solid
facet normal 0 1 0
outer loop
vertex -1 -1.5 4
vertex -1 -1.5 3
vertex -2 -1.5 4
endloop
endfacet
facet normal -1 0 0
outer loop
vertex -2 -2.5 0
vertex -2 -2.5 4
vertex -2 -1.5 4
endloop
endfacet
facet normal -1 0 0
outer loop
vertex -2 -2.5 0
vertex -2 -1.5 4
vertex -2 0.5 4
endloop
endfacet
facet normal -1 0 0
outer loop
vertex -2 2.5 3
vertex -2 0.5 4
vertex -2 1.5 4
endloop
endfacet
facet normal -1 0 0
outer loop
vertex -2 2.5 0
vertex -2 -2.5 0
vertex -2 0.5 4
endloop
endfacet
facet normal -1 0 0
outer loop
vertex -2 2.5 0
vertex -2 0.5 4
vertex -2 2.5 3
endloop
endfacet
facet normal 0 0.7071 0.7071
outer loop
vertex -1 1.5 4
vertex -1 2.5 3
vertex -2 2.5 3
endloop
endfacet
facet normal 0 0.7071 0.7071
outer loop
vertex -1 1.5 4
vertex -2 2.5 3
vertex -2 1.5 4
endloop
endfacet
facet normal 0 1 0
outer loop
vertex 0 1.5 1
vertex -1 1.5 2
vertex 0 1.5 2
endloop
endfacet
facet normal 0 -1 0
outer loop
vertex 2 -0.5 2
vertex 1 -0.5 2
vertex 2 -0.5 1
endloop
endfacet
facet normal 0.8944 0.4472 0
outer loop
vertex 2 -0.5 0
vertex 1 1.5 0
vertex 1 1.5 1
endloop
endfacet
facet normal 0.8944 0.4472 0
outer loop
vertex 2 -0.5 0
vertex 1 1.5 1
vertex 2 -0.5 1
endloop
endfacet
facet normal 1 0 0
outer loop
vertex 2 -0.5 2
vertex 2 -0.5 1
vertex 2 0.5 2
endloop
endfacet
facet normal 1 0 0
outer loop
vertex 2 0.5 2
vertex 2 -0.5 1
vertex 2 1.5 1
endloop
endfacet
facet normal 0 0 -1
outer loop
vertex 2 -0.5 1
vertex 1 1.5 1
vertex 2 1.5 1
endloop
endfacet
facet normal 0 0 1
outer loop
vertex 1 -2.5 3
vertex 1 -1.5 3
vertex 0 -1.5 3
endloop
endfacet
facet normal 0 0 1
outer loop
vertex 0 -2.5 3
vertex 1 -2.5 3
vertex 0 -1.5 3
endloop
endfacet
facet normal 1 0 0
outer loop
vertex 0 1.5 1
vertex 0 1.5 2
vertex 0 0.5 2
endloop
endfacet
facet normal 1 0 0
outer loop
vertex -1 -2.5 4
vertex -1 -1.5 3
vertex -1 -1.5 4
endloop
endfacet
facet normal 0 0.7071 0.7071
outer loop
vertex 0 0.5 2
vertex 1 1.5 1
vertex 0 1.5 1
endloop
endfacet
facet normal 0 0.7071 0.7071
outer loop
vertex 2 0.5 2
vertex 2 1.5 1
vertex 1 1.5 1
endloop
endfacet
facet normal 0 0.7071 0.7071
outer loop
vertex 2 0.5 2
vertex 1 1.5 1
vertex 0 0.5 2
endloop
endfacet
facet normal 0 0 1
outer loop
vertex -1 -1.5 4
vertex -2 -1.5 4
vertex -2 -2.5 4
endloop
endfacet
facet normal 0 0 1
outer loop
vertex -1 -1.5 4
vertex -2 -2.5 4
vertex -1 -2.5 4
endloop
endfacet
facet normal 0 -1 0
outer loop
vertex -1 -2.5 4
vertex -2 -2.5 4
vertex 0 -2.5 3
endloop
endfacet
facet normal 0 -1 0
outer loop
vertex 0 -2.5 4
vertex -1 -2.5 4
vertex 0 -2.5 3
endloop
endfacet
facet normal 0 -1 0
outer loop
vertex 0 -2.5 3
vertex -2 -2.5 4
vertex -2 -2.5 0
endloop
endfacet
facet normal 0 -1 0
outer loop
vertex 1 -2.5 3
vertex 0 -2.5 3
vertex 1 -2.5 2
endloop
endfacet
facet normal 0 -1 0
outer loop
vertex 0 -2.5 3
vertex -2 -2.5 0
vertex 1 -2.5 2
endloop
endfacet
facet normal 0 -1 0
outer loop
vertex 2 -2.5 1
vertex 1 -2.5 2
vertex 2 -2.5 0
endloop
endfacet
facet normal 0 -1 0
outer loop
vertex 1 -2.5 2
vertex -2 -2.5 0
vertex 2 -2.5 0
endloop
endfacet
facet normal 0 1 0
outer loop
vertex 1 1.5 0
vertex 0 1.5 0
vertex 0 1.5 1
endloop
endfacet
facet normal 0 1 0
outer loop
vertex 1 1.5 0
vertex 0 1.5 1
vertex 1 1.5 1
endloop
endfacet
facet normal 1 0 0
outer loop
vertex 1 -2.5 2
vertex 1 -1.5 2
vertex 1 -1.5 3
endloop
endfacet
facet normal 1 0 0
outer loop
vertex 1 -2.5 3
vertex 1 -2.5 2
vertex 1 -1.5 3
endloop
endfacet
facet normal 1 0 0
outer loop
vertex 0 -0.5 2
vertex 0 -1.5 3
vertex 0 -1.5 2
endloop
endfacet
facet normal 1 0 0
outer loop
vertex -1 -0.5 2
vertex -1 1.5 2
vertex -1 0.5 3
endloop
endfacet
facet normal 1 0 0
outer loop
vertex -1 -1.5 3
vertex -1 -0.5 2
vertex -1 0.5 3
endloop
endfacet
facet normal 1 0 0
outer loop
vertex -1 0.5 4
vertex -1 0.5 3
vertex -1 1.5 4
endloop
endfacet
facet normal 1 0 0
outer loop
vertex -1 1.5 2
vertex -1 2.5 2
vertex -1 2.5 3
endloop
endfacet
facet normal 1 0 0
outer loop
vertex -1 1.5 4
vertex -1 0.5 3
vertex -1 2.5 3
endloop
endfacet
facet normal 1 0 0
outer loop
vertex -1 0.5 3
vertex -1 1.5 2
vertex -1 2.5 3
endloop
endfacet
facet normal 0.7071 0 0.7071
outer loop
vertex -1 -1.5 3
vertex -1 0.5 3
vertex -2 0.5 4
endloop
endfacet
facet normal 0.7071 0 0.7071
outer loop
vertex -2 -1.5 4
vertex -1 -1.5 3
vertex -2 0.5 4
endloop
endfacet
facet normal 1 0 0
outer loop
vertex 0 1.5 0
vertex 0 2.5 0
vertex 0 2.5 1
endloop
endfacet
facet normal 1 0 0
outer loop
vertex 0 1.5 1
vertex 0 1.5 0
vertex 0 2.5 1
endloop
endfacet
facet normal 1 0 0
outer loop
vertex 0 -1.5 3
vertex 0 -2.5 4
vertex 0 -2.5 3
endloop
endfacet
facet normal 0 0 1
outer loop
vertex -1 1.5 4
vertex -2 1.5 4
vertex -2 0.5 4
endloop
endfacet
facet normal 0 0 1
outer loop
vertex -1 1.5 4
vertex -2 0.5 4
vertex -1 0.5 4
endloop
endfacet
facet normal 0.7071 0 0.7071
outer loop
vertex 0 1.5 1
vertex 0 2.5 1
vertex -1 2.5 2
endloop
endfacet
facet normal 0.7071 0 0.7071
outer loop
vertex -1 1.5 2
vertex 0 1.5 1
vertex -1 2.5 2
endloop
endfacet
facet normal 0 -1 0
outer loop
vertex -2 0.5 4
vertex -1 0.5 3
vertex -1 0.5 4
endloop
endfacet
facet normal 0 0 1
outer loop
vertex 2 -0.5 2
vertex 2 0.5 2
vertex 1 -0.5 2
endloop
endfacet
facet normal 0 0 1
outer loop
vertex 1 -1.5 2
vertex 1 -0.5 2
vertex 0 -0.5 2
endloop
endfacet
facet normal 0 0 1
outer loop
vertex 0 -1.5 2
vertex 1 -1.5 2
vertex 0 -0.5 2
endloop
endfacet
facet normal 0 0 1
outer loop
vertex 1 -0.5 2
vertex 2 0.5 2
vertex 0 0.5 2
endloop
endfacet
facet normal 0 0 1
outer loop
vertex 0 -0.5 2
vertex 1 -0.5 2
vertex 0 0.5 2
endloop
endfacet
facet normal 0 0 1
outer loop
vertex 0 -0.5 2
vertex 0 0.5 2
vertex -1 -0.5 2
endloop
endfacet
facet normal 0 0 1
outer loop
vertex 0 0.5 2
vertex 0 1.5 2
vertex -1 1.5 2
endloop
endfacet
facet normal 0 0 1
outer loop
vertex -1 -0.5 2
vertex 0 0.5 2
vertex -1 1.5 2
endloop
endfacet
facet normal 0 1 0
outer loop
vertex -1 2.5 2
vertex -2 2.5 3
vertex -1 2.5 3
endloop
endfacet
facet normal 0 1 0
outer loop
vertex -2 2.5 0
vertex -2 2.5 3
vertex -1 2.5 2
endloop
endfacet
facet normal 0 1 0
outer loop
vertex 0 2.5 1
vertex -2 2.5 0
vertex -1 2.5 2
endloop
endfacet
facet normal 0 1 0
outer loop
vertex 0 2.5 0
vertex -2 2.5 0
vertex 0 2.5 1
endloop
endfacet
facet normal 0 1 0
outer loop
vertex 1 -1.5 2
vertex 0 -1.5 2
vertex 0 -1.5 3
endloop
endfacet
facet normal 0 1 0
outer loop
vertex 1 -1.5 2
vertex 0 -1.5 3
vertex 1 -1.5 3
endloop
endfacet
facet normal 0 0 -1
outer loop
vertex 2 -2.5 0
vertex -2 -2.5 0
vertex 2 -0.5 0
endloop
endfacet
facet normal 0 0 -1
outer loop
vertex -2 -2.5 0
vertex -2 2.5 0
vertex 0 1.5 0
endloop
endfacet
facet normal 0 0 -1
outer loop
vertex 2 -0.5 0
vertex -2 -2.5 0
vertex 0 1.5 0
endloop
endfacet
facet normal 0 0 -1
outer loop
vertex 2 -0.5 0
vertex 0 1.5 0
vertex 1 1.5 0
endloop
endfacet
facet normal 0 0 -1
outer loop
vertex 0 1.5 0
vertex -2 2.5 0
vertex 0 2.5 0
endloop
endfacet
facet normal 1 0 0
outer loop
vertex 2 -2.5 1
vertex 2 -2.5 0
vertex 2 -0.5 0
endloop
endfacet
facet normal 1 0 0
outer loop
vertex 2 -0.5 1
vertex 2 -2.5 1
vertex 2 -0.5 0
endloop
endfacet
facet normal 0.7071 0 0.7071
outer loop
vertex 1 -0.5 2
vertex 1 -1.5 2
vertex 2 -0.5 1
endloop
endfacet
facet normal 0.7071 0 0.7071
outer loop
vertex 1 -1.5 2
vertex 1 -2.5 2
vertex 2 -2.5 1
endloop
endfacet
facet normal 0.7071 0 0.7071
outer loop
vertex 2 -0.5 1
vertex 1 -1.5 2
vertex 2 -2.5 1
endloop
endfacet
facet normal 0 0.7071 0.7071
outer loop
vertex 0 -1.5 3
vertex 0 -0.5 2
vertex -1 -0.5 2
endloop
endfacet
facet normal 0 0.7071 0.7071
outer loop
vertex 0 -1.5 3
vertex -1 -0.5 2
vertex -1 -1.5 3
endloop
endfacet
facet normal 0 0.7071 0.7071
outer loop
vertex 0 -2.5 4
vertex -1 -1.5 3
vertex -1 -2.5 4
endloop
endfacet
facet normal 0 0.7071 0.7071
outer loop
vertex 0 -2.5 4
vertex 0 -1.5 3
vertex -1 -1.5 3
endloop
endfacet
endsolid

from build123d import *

# Parameters (mm, degrees)
SKETCH1_W           = 4
SKETCH1_H           = 5
BOSS_EXTRUDE1_DEPTH = 4
CUT_EXTRUDE1_DEPTH  = 5
CUT_EXTRUDE2_DEPTH  = 1
CUT_EXTRUDE3_DEPTH  = 1
CUT_EXTRUDE4_DEPTH  = 2
SKETCH6_W           = 2
SKETCH6_H           = 2
CUT_EXTRUDE5_DEPTH  = 4
CUT_EXTRUDE6_DEPTH  = 2
CUT_EXTRUDE7_DEPTH  = 1
CUT_EXTRUDE8_DEPTH  = 2
SKETCH12_W          = 1.414213562
SKETCH12_H          = 2
CUT_EXTRUDE9_DEPTH  = 3.828427125


with BuildPart() as part:
    # Sketch1 → Boss-Extrude1 (new body)
    with BuildSketch(Plane.XY):
        Rectangle(SKETCH1_W, SKETCH1_H)
    extrude(amount=BOSS_EXTRUDE1_DEPTH)

    # Sketch2 → Cut-Extrude1 (cut, through all)
    with BuildSketch(Plane(origin=(2, 0, 0), x_dir=(0, 0, -1), z_dir=(1, 0, 0))):
        Polygon((-3, 2.5), (-4, 1.5), (-4, 2.5), align=None)
    extrude(amount=-CUT_EXTRUDE1_DEPTH, mode=Mode.SUBTRACT)

    # Sketch3 → Cut-Extrude2 (cut)
    with BuildSketch(Plane(origin=(0, 2.5, 0), x_dir=(1, 0, 0), z_dir=(0, 1, 0))):
        Polygon((2, 0), (0, 0), (0, -1), (-1, -2), (-1, -3), (2, -3), align=None)
    extrude(amount=-CUT_EXTRUDE2_DEPTH, mode=Mode.SUBTRACT)

    # Sketch4 → Cut-Extrude3 (cut)
    with BuildSketch(Plane(origin=(0, 0, 0), x_dir=(-1, 0, 0), z_dir=(0, 0, -1))):
        Polygon((-2, 1.5), (-1, 1.5), (-2, -0.5), align=None)
    extrude(amount=-CUT_EXTRUDE3_DEPTH, mode=Mode.SUBTRACT)

    # Sketch5 → Cut-Extrude4 (cut)
    with BuildSketch(Plane(origin=(2, 0, 0), x_dir=(0, 0, -1), z_dir=(1, 0, 0))):
        Polygon((-1, 1.5), (-2, 0.5), (-2, 1.5), align=None)
    extrude(amount=-CUT_EXTRUDE4_DEPTH, mode=Mode.SUBTRACT)

    # Sketch6 → Cut-Extrude5 (cut)
    with BuildSketch(Plane(origin=(0, 2.5, 0), x_dir=(1, 0, 0), z_dir=(0, 1, 0))):
        with Locations((1, -3)):
            Rectangle(SKETCH6_W, SKETCH6_H)
    extrude(amount=-CUT_EXTRUDE5_DEPTH, mode=Mode.SUBTRACT)

    # Sketch7 → Cut-Extrude6 (cut, through all)
    with BuildSketch(Plane(origin=(0, -1.5, 0), x_dir=(1, 0, 0), z_dir=(0, 1, 0))):
        Polygon((2, -2), (1, -2), (1, -3), (0, -3), (0, -4), (2, -4), align=None)
    extrude(amount=-CUT_EXTRUDE6_DEPTH, mode=Mode.SUBTRACT)

    # Sketch8 → Cut-Extrude7 (cut)
    with BuildSketch(Plane(origin=(0, 0, 0), x_dir=(0, 0, -1), z_dir=(1, 0, 0))):
        Polygon((-2, -0.5), (-4, -2.5), (-4, 2.5), (-2, 2.5), align=None)
    extrude(amount=-CUT_EXTRUDE7_DEPTH, mode=Mode.SUBTRACT)

    # Sketch9 → Cut-Extrude8 (cut)
    with BuildSketch(Plane.XZ.offset(2.5)):
        Polygon((1, 2), (2, 1), (2, 2), align=None)
    extrude(amount=-CUT_EXTRUDE8_DEPTH, mode=Mode.SUBTRACT)

    # Sketch12 → Cut-Extrude9 (cut, through all)
    with BuildSketch(Plane(origin=(1, 0, 1), x_dir=(-0.707106781, 0, 0.707106781), z_dir=(-0.707106781, 0, -0.707106781))):
        with Locations((3.535533906, -0.5)):
            Rectangle(SKETCH12_W, SKETCH12_H)
    extrude(amount=-CUT_EXTRUDE9_DEPTH, mode=Mode.SUBTRACT)


solid = part.part
